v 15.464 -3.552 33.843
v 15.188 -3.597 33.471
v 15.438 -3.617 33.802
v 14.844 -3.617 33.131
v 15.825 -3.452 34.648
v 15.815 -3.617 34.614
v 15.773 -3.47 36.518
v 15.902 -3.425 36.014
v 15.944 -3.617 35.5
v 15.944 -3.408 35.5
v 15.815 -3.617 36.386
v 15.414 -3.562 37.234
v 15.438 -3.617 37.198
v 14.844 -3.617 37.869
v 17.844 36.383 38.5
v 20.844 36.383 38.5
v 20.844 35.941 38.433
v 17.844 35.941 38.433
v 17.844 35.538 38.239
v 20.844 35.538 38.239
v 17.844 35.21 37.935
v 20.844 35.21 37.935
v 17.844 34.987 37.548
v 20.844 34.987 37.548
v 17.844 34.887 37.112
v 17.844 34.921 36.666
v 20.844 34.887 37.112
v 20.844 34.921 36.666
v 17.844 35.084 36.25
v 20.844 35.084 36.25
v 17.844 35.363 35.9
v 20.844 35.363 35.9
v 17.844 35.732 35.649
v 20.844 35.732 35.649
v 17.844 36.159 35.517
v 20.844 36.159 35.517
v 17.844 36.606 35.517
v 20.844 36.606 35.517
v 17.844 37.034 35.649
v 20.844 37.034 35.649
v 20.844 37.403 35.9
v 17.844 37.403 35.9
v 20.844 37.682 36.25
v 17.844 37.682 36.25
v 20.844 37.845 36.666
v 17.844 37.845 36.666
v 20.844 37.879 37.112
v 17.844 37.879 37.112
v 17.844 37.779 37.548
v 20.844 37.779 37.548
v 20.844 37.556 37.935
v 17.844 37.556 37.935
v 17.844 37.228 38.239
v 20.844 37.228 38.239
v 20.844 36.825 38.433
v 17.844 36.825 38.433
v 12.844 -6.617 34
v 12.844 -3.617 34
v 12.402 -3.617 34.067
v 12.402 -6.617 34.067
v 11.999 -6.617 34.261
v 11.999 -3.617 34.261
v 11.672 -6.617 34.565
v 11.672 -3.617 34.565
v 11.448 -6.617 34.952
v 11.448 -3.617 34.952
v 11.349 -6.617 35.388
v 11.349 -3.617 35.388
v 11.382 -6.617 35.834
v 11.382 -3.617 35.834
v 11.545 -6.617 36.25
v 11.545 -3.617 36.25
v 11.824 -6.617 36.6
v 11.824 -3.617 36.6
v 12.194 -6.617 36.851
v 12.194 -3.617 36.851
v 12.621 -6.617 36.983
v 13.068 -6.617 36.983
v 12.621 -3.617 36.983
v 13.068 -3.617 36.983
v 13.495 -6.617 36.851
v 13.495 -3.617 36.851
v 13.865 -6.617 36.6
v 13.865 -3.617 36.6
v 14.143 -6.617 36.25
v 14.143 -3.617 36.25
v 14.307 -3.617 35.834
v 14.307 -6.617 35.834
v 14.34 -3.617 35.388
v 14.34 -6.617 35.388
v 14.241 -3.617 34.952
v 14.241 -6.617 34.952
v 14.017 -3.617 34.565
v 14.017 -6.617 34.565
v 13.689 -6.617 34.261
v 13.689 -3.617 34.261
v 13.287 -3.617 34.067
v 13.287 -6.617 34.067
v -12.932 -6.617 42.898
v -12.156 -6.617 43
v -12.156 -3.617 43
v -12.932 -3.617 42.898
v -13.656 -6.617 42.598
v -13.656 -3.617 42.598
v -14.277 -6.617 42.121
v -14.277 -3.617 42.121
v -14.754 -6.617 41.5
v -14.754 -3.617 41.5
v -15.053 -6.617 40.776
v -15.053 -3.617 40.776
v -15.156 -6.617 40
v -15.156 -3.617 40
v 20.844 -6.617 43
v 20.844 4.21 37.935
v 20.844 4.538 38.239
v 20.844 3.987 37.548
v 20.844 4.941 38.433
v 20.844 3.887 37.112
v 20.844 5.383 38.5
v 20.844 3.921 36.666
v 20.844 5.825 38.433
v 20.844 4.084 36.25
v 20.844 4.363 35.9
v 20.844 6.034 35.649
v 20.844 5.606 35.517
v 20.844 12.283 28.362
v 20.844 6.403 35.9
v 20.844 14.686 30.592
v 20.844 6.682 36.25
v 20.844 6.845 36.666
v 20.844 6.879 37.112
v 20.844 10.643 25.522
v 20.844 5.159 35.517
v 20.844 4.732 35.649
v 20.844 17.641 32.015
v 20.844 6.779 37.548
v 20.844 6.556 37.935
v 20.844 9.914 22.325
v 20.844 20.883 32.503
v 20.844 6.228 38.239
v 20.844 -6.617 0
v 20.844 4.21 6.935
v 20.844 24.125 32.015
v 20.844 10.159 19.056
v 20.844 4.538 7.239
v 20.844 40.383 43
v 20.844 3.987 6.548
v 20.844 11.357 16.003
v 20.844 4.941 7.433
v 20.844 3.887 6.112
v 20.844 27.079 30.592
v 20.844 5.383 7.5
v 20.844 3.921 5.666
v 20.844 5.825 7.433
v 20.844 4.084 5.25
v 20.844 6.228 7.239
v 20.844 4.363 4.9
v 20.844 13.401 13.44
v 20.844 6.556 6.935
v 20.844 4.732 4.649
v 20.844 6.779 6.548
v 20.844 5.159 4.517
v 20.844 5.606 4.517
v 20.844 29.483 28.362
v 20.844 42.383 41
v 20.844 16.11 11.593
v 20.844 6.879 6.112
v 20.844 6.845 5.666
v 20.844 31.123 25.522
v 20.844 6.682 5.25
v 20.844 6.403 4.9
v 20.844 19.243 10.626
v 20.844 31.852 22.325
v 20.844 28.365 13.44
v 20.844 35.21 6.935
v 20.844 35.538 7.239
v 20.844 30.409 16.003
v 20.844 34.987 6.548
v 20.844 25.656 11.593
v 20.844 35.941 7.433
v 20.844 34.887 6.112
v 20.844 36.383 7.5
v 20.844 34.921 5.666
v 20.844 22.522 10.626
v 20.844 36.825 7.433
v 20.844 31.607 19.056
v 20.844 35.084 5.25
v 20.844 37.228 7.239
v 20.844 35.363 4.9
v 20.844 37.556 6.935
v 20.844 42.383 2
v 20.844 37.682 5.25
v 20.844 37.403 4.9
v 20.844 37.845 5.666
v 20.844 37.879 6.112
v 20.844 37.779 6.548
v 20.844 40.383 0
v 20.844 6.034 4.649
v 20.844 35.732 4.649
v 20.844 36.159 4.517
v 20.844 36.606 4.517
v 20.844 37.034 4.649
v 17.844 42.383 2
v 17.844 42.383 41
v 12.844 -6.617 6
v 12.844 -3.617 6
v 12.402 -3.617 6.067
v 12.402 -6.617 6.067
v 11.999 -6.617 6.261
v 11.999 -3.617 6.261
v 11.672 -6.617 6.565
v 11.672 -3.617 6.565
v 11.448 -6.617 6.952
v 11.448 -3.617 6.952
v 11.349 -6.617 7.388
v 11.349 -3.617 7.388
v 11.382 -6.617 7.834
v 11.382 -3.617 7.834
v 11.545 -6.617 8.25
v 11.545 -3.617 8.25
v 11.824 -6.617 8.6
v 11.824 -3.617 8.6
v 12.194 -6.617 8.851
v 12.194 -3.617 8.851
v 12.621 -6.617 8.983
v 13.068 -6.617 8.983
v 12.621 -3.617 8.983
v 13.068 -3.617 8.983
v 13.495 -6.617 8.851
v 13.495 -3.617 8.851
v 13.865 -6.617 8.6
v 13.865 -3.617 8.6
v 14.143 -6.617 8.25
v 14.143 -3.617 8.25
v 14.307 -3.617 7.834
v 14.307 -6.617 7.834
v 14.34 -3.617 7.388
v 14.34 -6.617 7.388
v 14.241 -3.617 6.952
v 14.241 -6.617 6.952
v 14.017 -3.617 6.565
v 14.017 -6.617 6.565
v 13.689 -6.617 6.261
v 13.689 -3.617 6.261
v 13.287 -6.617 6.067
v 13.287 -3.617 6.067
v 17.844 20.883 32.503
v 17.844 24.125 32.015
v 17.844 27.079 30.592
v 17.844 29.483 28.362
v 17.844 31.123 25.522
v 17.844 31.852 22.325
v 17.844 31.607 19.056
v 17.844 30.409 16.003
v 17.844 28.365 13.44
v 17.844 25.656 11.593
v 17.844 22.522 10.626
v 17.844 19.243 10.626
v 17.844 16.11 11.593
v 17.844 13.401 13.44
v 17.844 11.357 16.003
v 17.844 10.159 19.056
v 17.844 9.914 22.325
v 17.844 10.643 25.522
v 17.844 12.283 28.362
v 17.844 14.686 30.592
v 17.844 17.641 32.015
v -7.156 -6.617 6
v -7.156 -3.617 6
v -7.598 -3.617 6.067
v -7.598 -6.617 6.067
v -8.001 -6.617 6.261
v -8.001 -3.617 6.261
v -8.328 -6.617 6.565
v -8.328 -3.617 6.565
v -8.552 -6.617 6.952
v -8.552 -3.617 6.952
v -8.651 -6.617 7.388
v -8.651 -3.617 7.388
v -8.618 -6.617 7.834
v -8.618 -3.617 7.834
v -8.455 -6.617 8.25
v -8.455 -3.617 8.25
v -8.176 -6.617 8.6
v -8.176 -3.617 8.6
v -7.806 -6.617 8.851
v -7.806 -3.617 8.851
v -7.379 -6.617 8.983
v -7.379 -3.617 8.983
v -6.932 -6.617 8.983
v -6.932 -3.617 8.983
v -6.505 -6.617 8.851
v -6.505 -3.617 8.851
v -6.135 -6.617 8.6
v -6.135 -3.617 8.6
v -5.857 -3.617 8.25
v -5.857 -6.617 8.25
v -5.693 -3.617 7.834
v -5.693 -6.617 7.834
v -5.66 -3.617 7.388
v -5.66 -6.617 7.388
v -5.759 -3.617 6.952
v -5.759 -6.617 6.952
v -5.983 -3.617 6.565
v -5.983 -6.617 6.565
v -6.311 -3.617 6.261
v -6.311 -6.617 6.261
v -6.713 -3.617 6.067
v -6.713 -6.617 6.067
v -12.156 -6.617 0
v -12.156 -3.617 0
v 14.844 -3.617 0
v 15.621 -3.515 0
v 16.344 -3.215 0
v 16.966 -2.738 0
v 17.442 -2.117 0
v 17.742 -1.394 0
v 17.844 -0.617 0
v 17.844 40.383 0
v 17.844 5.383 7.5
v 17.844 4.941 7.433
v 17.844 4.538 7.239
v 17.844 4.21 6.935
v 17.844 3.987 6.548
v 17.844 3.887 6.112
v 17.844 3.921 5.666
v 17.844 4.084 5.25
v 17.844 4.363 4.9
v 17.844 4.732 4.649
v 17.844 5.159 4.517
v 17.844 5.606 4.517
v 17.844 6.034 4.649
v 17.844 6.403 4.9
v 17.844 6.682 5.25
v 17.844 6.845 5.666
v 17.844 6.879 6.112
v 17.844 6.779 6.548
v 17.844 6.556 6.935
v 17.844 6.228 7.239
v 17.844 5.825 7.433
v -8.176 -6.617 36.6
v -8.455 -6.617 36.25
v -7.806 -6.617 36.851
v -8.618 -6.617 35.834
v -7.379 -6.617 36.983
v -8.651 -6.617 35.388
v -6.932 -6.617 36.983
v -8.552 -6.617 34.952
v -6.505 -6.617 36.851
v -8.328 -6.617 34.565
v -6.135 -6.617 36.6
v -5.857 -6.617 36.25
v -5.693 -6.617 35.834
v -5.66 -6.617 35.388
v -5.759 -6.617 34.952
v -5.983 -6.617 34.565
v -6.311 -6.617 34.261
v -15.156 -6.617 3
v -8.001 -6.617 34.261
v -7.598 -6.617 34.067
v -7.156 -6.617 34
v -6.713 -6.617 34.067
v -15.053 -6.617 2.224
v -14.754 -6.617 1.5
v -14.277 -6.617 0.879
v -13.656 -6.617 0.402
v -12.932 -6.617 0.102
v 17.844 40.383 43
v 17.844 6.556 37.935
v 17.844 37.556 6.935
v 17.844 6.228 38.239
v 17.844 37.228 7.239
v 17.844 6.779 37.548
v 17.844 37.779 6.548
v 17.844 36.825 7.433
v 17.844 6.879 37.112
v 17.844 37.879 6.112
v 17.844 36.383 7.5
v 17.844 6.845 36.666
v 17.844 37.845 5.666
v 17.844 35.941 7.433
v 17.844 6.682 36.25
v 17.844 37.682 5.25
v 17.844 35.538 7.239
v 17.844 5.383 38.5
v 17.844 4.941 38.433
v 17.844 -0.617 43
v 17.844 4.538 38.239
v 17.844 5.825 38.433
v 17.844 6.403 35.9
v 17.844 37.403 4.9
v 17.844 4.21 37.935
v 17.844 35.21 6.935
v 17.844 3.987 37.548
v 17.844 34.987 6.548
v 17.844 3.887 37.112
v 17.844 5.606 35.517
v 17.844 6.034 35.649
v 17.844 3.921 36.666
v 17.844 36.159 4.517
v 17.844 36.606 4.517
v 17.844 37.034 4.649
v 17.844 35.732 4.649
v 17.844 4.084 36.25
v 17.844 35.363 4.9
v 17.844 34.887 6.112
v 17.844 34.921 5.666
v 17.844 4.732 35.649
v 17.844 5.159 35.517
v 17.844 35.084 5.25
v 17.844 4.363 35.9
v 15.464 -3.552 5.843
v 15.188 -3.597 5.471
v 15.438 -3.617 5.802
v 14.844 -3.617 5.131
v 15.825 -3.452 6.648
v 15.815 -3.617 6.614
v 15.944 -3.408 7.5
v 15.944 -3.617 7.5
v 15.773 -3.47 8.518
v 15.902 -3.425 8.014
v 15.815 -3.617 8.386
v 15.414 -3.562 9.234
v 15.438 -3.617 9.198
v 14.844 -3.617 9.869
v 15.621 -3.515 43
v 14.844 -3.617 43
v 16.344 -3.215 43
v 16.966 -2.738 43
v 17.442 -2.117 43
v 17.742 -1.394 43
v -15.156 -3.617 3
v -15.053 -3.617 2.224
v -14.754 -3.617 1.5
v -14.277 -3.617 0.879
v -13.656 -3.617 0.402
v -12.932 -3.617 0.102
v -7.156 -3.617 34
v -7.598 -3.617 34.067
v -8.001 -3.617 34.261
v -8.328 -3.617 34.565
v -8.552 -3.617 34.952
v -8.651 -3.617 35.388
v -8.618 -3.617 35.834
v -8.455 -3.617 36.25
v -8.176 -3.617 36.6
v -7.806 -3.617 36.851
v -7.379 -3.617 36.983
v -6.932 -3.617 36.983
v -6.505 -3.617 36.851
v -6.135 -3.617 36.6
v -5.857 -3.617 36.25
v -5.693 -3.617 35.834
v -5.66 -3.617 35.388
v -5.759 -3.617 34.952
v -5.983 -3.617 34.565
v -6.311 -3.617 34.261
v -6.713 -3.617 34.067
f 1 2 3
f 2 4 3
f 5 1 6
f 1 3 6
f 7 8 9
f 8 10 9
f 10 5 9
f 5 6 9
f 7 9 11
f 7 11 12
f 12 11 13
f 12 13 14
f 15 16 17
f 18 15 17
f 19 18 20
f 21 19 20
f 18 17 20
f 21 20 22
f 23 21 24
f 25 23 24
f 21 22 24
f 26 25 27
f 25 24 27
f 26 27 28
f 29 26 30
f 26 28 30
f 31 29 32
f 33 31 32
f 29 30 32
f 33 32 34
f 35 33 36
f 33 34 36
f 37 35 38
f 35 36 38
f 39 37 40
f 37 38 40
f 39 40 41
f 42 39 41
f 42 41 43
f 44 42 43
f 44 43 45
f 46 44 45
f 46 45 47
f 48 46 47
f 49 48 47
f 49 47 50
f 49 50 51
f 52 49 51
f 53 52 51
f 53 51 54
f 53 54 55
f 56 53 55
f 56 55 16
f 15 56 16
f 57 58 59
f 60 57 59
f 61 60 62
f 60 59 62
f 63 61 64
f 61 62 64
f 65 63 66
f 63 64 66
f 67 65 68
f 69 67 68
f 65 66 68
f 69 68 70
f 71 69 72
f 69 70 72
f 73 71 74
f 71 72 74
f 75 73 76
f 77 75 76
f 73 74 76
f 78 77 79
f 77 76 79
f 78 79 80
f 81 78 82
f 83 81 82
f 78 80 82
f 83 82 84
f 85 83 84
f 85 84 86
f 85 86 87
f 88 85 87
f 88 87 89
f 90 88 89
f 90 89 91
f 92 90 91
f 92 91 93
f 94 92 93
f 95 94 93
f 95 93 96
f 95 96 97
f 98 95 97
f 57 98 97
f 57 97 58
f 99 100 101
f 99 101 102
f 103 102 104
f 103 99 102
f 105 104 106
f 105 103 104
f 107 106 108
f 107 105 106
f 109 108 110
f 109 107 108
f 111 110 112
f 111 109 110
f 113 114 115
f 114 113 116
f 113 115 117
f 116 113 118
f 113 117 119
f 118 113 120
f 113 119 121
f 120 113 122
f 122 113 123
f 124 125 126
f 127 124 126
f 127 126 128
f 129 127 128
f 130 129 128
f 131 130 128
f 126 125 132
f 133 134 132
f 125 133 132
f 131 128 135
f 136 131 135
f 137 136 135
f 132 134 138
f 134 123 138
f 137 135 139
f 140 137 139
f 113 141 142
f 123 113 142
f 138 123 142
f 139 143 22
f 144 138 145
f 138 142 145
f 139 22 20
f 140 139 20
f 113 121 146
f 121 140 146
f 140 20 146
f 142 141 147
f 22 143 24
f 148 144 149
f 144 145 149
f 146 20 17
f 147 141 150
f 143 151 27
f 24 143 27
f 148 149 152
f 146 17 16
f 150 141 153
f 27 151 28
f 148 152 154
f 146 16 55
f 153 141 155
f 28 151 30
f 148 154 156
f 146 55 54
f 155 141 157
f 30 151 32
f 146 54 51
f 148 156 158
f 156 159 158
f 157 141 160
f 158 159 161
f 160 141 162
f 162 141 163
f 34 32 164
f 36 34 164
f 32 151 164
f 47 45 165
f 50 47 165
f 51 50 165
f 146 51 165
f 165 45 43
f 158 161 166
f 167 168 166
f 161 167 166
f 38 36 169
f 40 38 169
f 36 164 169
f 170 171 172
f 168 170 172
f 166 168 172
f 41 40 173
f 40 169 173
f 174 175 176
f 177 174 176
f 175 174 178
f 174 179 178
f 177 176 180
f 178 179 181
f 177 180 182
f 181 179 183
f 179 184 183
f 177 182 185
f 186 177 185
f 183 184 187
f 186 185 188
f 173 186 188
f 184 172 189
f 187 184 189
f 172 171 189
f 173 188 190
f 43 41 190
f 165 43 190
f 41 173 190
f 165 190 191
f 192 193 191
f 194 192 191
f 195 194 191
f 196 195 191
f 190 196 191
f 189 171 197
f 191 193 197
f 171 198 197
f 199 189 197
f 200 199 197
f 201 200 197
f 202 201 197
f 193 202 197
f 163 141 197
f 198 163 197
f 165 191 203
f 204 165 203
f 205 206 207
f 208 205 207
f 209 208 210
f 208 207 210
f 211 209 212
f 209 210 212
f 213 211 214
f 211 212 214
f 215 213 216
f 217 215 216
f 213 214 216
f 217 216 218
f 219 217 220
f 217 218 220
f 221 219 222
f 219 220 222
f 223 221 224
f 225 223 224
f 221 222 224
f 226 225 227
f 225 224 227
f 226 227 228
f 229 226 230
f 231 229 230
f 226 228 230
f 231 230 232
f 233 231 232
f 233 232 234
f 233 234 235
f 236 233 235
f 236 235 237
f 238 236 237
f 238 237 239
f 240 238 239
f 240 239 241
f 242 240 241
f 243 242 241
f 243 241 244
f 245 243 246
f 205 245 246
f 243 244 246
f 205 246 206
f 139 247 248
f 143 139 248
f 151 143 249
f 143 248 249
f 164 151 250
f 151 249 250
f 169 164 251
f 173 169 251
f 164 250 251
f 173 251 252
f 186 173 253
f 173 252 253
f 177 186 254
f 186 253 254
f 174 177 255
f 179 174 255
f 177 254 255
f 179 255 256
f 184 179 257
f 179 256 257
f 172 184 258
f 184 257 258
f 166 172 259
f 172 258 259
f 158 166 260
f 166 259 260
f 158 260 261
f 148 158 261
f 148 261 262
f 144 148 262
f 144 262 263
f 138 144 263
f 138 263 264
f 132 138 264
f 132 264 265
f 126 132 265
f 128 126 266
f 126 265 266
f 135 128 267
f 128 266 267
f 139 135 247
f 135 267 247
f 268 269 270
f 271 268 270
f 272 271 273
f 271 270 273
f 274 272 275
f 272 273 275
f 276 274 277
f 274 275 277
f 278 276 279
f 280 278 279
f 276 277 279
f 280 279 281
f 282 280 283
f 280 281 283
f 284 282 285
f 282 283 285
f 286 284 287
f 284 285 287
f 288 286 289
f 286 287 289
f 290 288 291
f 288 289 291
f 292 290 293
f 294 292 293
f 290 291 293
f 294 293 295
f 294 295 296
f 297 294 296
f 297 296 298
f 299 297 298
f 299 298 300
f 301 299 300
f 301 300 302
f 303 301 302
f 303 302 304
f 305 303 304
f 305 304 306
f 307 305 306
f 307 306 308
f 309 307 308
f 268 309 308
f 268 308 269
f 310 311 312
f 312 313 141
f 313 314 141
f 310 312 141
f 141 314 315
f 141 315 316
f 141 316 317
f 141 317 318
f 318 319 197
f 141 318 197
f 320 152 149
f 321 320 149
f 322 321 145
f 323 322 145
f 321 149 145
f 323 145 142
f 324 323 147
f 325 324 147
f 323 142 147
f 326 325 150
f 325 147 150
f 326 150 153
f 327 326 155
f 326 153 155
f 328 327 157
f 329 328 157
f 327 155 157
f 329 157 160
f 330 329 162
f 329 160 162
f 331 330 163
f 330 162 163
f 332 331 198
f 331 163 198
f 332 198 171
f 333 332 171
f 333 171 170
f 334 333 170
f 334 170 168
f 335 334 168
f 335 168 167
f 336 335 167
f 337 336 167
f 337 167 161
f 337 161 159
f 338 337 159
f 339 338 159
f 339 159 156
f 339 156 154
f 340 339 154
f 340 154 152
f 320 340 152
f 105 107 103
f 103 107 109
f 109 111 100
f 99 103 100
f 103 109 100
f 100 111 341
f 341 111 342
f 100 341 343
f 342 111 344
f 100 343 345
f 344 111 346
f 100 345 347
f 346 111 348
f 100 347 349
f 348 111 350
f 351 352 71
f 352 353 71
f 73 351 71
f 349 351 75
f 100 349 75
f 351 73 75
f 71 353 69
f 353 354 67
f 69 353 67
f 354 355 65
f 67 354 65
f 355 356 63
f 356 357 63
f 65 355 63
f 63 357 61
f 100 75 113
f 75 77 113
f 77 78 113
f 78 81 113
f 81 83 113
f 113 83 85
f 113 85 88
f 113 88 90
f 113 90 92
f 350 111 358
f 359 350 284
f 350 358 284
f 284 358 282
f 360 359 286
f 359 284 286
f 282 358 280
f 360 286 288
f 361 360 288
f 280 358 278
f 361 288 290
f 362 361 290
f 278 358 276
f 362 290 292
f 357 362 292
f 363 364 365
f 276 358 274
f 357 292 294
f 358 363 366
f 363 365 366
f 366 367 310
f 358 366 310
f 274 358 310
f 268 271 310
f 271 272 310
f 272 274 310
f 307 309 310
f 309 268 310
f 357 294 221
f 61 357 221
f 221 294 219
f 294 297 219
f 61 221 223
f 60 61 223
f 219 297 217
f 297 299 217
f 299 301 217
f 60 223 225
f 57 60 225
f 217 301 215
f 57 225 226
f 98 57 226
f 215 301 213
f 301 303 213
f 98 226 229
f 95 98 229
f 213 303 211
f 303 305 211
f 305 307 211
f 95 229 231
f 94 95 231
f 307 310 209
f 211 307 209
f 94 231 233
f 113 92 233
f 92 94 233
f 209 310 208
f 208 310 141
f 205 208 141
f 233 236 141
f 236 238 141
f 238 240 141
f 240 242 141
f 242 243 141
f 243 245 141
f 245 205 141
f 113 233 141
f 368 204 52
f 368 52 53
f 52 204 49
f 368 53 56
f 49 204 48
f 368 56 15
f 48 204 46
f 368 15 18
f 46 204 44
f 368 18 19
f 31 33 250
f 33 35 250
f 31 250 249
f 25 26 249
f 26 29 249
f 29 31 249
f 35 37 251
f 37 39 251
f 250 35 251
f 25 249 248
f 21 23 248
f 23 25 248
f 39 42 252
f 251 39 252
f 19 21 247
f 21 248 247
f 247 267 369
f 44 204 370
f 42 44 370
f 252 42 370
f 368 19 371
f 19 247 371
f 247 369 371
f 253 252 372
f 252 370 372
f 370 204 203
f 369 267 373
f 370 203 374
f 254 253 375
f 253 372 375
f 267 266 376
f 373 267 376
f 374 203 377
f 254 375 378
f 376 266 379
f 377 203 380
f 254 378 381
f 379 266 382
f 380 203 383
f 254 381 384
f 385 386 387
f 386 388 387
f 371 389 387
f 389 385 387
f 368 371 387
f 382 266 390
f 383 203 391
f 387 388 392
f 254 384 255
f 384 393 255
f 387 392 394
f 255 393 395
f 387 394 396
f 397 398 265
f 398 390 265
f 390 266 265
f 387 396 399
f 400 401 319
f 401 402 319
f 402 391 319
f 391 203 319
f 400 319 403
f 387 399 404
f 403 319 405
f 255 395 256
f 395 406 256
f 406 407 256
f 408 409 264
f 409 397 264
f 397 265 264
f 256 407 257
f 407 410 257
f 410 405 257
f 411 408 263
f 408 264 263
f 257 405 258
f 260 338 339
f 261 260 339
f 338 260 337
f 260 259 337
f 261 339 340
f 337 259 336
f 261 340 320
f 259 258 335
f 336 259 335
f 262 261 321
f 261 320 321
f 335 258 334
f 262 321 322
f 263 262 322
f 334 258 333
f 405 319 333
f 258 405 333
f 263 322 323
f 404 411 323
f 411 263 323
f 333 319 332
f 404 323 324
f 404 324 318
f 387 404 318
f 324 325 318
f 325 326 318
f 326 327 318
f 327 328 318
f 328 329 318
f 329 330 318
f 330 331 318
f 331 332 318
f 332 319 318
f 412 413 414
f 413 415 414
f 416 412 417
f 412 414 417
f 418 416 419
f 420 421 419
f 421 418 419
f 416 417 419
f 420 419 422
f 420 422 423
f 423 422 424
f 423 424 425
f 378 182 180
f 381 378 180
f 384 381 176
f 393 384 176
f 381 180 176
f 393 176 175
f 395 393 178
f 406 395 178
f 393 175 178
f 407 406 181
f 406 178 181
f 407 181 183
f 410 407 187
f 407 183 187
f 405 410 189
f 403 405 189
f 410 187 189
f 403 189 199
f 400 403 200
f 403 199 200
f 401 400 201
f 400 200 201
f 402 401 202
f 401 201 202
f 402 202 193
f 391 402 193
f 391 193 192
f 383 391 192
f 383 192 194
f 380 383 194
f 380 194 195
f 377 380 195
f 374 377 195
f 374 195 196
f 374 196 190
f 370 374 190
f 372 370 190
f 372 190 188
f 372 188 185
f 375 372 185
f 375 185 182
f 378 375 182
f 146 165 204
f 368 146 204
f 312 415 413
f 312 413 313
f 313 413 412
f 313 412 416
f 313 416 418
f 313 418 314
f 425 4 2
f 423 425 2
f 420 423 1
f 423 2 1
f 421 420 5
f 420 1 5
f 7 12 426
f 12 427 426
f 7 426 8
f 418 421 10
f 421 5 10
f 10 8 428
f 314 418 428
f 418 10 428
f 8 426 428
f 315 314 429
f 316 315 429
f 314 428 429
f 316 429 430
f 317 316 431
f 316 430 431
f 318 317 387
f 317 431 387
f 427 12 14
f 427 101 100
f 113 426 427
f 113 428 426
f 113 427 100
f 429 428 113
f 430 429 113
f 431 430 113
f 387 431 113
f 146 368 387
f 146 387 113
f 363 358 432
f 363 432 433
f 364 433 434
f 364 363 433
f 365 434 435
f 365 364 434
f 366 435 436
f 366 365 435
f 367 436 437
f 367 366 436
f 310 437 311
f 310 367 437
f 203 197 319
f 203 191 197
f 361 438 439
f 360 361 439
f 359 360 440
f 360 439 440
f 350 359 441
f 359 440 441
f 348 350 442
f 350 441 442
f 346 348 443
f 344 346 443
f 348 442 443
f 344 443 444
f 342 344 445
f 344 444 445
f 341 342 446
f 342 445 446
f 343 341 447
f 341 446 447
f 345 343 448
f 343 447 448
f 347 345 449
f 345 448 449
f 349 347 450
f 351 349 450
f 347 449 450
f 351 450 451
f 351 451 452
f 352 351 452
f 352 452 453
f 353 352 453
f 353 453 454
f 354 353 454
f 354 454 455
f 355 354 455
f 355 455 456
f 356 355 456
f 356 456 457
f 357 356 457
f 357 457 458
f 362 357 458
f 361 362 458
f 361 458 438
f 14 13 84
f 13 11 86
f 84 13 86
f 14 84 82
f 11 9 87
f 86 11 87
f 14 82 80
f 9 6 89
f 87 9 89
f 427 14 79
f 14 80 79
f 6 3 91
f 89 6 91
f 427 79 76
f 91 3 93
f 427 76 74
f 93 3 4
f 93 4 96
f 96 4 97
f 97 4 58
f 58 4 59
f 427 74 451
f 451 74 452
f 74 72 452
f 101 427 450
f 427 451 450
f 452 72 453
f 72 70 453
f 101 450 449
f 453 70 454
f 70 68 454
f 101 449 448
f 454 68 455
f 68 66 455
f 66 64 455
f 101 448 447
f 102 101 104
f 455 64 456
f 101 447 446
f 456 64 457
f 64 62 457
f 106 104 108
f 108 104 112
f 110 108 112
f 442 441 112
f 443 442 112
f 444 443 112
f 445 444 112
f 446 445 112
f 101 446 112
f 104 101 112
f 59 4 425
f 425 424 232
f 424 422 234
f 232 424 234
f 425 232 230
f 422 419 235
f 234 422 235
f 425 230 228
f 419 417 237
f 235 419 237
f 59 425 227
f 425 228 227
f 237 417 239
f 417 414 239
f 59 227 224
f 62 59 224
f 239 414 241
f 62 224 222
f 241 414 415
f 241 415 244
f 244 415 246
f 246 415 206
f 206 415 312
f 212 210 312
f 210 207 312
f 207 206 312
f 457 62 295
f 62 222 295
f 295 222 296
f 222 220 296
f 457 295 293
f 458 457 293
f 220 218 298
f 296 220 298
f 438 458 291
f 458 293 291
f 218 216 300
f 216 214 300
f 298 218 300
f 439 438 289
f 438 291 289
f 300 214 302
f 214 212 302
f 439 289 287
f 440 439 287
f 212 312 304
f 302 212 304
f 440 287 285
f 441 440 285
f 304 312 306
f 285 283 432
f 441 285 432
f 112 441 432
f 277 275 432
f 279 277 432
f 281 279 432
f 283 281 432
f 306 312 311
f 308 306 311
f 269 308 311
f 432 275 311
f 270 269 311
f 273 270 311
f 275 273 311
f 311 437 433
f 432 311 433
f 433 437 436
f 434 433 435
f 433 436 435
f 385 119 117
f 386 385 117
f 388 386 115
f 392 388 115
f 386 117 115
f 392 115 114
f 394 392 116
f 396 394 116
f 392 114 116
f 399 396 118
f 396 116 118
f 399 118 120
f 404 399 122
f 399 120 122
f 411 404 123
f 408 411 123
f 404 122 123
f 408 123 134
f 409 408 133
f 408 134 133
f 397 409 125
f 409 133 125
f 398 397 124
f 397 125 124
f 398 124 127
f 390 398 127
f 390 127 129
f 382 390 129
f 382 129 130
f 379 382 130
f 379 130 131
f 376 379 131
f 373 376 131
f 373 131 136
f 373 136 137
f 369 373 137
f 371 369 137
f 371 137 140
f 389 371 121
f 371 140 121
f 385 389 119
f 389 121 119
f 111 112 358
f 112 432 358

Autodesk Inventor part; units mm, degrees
ref_plane "YZ Plane" through (0, 0, 0) normal (1, 0, 0) x (0, 1, 0)
ref_plane "XZ Plane" through (0, 0, 0) normal (0, 1, 0) x (-1, 0, 0)
ref_plane "XY Plane" through (0, 0, 0) normal (0, 0, 1) x (1, 0, 0)
sketch "Szkic1" plane through (0, 0, 0) normal (0, 0, 1) x (1, 0, 0)
  line L0 (-15.1556, -3.6171) -> (-15.1556, -6.6171)
  line L1 (-15.1556, -6.6171) -> (20.8444, -6.6171)
  line L2 (20.8444, -6.6171) -> (20.8444, 42.3829)
  line L3 (20.8444, 42.3829) -> (17.8444, 42.3829)
  line L4 (17.8444, 42.3829) -> (17.8444, -3.6171)
  line L5 (17.8444, -3.6171) -> (-15.1556, -3.6171)
  point P0 (0, 0)
  dimension "d0" = 3
  dimension "d1" = 36
  dimension "d2" = 49
  dimension "d3" = 3
extrude "Wyciągnięcie proste1" add sketch "Szkic1" along normal blind 43
fillet "Zaokrąglenie1" radius 3 1 edges at (17.8444, -3.6171, 21.5)
sketch "Szkic2" plane through (17.8444, 42.3829, 0) normal (-1, 0, 0) x (0, 0, 1)
  circle A0 centre (21.5033, -21.5) radius 11
  circle A1 centre (21.5, -21.5) radius 16.25
  line L0 (0, 0) -> (0, -43) projected
  line L1 (0, 0) -> (43, 0) projected
  line L2 (43, 0) -> (43, -43) projected
  line L3 (0.5, -0.5) -> (42.5, -0.5)
  line L4 (42.5, -0.5) -> (42.5, -42.5)
  line L5 (42.5, -42.5) -> (0.5, -42.5)
  line L6 (0.5, -42.5) -> (0.5, -0.5)
  point P0 (0, -42.3829)
  point P1 (37, -37)
  point P2 (37, -6)
  point P3 (6, -6)
  point P4 (6, -37)
  dimension "d61" = 42
  dimension "d62" = 42
  dimension "d63" = 0.5
  dimension "d64" = 0.5
  dimension "d65" = 5.5
  dimension "d66" = 5.5
  dimension "d67" = 5.5
  dimension "d68" = 5.5
  dimension "d69" = 5.5
  dimension "d70" = 5.5
  dimension "d71" = 5.5
  dimension "d72" = 5.5
  dimension "d73" = 21
  dimension "d74" = 21
extrude "Wyciągnięcie proste2" cut sketch "Szkic2" against normal blind 43 contours A0
hole "Otwór1" at (17.8444, 5.3829, 6) at (17.8444, 36.3829, 6) at (17.8444, 36.3829, 37) at (17.8444, 5.3829, 37) direction (1, 0, 0) diameter 3 end through all
chamfer "Faza1" distance 2 angle 45 2 edges at (19.3444, 42.3829, 43) (19.3444, 42.3829, 0)
fillet "Zaokrąglenie2" radius 3 2 edges at (-15.1556, -5.1171, 0) (-15.1556, -5.1171, 43)
sketch "Szkic3" plane through (20.8444, -6.6171, 0) normal (0, -1, 0) x (1, 0, 0)
  arc A0 (-33, 43) -> (-36, 40) centre (-33, 40) ccw projected
  line L0 (-36, 3) -> (-36, 40) projected
  arc A1 (-36, 3) -> (-33, 0) centre (-33, 3) ccw projected
  line L1 (-33, 0) -> (0, 0) projected
  line L2 (0, 0) -> (0, 43) projected
  line L3 (-33, 43) -> (0, 43) projected
  point P0 (-20.8444, 0)
  point P1 (-28, 7.5)
  point P2 (-8, 7.5)
  point P3 (-28, 35.5)
  point P4 (-8, 35.5)
  dimension "d32" = 20
  dimension "d33" = 20
  dimension "d34" = 36
  dimension "d35" = 8
  dimension "d36" = 8
  dimension "d37" = 7.5
  dimension "d38" = 7.5
  dimension "d39" = 7.5
  dimension "d40" = 7.5
hole "Otwór2" at (-7.1556, -6.6171, 7.5) at (12.8444, -6.6171, 7.5) at (-7.1556, -6.6171, 35.5) at (12.8444, -6.6171, 35.5) direction (0, 1, 0) diameter 3 end through all
sketch "Szkic4" plane through (14.8444, -3.6171, 43) normal (0, 1, 0) x (1, 0, 0)
  circle A0 centre (-2, 7.5) radius 1.5 projected
  circle A1 centre (-2, 35.5) radius 1.5 projected
  circle A2 centre (-2, 7.5) radius 3.1
  circle A3 centre (-2, 35.5) radius 3.1
  point P0 (-14.8444, 43)
  dimension "d48" = 6.2
  dimension "d49" = 6.2
extrude "Wyciągnięcie proste3" cut sketch "Szkic4" along normal blind 2
equation "\"d66\" = d65"
equation "\"d67\" = d65"
equation "\"d68\" = d65"
equation "\"d69\" = d65"
equation "\"d70\" = d65"
equation "\"d71\" = d65"
equation "\"d72\" = d65"
equation "\"d35\" = -0.5 * d32 + 0.5 * d34"
equation "\"d36\" = d35"
equation "\"d38\" = d37"
equation "\"d39\" = d37"
equation "\"d40\" = d37"
properties part number "CNCM_ALU_X_Axis_Nema_17_Mount"
